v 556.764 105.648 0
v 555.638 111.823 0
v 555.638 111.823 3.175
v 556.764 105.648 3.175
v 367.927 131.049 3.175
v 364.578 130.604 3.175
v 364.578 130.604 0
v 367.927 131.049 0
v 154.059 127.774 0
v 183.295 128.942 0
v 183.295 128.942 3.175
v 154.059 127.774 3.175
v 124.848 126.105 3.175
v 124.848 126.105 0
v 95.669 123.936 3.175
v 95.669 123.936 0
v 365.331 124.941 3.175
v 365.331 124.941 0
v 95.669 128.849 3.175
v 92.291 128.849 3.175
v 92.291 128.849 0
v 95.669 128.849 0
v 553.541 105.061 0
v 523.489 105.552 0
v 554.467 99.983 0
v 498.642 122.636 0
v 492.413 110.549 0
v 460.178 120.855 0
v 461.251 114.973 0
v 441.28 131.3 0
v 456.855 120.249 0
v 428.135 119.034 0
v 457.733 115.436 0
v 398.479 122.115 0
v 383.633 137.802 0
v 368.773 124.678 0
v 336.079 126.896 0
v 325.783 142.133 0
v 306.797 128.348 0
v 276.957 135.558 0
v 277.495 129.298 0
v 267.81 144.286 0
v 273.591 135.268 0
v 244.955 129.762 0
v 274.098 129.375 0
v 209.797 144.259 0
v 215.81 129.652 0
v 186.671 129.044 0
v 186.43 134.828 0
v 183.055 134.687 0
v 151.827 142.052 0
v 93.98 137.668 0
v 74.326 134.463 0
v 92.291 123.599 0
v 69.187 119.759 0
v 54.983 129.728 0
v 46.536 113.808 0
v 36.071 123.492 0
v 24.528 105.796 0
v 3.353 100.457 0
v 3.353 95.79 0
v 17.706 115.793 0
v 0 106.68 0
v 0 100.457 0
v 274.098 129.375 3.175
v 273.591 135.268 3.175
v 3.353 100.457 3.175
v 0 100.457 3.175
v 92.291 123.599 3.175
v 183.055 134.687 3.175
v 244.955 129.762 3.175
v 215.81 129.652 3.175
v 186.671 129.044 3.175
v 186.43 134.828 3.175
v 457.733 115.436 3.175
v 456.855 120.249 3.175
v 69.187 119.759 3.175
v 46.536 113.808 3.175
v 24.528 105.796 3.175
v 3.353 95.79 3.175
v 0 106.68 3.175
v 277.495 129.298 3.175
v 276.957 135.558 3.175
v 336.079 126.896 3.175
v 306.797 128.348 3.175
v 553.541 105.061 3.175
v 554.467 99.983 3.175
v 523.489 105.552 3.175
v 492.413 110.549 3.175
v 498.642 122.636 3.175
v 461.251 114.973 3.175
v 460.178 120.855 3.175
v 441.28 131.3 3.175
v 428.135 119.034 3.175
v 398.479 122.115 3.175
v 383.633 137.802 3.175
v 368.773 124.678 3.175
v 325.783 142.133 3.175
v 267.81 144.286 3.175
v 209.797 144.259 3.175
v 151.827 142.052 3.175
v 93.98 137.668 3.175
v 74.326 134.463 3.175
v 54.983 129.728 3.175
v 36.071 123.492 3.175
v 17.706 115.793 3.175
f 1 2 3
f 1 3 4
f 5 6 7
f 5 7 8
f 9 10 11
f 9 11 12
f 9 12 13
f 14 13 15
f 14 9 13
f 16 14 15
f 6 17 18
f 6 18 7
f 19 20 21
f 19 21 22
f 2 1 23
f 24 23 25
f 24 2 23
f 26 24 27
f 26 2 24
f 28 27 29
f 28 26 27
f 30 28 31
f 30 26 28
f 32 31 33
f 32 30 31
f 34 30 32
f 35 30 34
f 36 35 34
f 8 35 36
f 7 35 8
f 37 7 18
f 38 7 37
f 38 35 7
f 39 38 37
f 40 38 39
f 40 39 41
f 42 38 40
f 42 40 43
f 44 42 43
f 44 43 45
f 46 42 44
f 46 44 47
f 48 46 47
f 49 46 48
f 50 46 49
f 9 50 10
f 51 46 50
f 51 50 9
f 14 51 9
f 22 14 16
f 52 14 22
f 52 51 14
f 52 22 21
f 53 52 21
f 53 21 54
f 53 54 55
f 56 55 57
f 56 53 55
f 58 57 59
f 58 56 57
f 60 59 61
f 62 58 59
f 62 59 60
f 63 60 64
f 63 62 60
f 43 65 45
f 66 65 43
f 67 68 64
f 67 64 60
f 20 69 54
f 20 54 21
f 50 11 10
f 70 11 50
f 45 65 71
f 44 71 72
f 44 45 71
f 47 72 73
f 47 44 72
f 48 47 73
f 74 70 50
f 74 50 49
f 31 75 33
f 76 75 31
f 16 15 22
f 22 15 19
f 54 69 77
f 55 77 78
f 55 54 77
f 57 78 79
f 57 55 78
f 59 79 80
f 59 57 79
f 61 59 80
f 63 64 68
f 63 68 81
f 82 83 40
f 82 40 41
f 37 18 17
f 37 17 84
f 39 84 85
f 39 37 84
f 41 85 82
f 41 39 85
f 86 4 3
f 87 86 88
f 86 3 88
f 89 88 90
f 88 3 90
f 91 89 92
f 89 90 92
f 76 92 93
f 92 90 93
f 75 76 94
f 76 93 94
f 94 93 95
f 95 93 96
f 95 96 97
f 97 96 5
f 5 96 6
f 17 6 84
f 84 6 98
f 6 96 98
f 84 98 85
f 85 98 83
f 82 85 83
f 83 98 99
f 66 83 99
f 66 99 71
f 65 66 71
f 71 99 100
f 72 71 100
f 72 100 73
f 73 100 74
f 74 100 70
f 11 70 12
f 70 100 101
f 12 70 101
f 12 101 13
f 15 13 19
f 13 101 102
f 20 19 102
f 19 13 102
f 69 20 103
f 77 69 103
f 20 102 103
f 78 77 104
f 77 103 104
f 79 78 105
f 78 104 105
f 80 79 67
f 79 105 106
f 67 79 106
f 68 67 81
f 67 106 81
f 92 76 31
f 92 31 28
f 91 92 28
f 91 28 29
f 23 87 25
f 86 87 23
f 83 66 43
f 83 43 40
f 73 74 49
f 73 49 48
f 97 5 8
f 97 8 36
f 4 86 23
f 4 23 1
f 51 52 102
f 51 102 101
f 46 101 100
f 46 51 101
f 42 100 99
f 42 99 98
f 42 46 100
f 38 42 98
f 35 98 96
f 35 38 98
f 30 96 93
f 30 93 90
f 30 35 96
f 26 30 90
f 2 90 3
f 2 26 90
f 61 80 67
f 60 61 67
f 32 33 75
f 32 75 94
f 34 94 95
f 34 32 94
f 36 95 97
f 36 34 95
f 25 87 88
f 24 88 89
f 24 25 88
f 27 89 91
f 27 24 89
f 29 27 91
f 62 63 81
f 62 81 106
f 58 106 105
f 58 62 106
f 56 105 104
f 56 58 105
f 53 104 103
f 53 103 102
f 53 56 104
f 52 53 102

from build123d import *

# Parameters (mm, degrees)
BOSS_EXTRUDE1_DEPTH = 3.175
SKETCH2_W           = 3.3528
SKETCH2_H           = 6.477
SKETCH2_W_2         = 3.3782
SKETCH2_H_2         = 12.7
CUT_EXTRUDE1_DEPTH  = 4.175


with BuildPart() as part:
    # Sketch1 → Boss-Extrude1 (new body)
    with BuildSketch(Plane.XY):
        with BuildLine():
            Line((555.638244479, 111.822940833), (557.916984218, 99.326538403))
            ThreePointArc((557.916984218, 99.326538403), (326.784483289, 127.411721364), (93.98, 123.794671649))
            ThreePointArc((93.98, 123.794671649), (45.52945751, 113.491169294), (0, 93.98))
            Line((0, 93.98), (0, 106.68))
            ThreePointArc((0, 106.68), (45.466310815, 126.795024577), (93.98, 137.668))
            ThreePointArc((93.98, 137.668), (325.782502236, 142.132503557), (555.638244479, 111.822940833))
        make_face()
    extrude(amount=BOSS_EXTRUDE1_DEPTH)

    # Sketch2 → Cut-Extrude1 (cut, through all)
    with BuildSketch(Plane.XY.offset(3.175)):
        with Locations((1.6764, 97.2185)):
            Rectangle(SKETCH2_W, SKETCH2_H)
        with Locations((93.98, 122.498746884)):
            Rectangle(SKETCH2_W_2, SKETCH2_H_2)
        Polygon((183.054551015, 134.687145422), (186.429805755, 134.828179757), (186.960010022, 122.139252165), (183.584755283, 121.99821783), align=None)
        Polygon((364.577933431, 130.603714492), (367.926681813, 131.048820676), (369.239873525, 121.16904642), (365.891125143, 120.723940236), align=None)
        Polygon((298.533171127, -116.284523632), (299.081273341, -122.651898671), (295.917971315, -122.924194999), (295.369869101, -116.55681996), align=None)
        Polygon((273.590830142, 135.268456112), (276.956583497, 135.558179406), (278.045768811, 122.904971301), (274.680015455, 122.615248007), align=None)
        Polygon((456.854976279, 120.249363717), (460.178373044, 120.855391093), (461.793693389, 111.99712722), (458.470296624, 111.391099845), align=None)
        Polygon((553.540722528, 105.060688054), (556.864119293, 105.666715431), (558.657365749, 95.832721624), (555.333968984, 95.226694247), align=None)
    extrude(amount=-CUT_EXTRUDE1_DEPTH, mode=Mode.SUBTRACT)


solid = part.part
